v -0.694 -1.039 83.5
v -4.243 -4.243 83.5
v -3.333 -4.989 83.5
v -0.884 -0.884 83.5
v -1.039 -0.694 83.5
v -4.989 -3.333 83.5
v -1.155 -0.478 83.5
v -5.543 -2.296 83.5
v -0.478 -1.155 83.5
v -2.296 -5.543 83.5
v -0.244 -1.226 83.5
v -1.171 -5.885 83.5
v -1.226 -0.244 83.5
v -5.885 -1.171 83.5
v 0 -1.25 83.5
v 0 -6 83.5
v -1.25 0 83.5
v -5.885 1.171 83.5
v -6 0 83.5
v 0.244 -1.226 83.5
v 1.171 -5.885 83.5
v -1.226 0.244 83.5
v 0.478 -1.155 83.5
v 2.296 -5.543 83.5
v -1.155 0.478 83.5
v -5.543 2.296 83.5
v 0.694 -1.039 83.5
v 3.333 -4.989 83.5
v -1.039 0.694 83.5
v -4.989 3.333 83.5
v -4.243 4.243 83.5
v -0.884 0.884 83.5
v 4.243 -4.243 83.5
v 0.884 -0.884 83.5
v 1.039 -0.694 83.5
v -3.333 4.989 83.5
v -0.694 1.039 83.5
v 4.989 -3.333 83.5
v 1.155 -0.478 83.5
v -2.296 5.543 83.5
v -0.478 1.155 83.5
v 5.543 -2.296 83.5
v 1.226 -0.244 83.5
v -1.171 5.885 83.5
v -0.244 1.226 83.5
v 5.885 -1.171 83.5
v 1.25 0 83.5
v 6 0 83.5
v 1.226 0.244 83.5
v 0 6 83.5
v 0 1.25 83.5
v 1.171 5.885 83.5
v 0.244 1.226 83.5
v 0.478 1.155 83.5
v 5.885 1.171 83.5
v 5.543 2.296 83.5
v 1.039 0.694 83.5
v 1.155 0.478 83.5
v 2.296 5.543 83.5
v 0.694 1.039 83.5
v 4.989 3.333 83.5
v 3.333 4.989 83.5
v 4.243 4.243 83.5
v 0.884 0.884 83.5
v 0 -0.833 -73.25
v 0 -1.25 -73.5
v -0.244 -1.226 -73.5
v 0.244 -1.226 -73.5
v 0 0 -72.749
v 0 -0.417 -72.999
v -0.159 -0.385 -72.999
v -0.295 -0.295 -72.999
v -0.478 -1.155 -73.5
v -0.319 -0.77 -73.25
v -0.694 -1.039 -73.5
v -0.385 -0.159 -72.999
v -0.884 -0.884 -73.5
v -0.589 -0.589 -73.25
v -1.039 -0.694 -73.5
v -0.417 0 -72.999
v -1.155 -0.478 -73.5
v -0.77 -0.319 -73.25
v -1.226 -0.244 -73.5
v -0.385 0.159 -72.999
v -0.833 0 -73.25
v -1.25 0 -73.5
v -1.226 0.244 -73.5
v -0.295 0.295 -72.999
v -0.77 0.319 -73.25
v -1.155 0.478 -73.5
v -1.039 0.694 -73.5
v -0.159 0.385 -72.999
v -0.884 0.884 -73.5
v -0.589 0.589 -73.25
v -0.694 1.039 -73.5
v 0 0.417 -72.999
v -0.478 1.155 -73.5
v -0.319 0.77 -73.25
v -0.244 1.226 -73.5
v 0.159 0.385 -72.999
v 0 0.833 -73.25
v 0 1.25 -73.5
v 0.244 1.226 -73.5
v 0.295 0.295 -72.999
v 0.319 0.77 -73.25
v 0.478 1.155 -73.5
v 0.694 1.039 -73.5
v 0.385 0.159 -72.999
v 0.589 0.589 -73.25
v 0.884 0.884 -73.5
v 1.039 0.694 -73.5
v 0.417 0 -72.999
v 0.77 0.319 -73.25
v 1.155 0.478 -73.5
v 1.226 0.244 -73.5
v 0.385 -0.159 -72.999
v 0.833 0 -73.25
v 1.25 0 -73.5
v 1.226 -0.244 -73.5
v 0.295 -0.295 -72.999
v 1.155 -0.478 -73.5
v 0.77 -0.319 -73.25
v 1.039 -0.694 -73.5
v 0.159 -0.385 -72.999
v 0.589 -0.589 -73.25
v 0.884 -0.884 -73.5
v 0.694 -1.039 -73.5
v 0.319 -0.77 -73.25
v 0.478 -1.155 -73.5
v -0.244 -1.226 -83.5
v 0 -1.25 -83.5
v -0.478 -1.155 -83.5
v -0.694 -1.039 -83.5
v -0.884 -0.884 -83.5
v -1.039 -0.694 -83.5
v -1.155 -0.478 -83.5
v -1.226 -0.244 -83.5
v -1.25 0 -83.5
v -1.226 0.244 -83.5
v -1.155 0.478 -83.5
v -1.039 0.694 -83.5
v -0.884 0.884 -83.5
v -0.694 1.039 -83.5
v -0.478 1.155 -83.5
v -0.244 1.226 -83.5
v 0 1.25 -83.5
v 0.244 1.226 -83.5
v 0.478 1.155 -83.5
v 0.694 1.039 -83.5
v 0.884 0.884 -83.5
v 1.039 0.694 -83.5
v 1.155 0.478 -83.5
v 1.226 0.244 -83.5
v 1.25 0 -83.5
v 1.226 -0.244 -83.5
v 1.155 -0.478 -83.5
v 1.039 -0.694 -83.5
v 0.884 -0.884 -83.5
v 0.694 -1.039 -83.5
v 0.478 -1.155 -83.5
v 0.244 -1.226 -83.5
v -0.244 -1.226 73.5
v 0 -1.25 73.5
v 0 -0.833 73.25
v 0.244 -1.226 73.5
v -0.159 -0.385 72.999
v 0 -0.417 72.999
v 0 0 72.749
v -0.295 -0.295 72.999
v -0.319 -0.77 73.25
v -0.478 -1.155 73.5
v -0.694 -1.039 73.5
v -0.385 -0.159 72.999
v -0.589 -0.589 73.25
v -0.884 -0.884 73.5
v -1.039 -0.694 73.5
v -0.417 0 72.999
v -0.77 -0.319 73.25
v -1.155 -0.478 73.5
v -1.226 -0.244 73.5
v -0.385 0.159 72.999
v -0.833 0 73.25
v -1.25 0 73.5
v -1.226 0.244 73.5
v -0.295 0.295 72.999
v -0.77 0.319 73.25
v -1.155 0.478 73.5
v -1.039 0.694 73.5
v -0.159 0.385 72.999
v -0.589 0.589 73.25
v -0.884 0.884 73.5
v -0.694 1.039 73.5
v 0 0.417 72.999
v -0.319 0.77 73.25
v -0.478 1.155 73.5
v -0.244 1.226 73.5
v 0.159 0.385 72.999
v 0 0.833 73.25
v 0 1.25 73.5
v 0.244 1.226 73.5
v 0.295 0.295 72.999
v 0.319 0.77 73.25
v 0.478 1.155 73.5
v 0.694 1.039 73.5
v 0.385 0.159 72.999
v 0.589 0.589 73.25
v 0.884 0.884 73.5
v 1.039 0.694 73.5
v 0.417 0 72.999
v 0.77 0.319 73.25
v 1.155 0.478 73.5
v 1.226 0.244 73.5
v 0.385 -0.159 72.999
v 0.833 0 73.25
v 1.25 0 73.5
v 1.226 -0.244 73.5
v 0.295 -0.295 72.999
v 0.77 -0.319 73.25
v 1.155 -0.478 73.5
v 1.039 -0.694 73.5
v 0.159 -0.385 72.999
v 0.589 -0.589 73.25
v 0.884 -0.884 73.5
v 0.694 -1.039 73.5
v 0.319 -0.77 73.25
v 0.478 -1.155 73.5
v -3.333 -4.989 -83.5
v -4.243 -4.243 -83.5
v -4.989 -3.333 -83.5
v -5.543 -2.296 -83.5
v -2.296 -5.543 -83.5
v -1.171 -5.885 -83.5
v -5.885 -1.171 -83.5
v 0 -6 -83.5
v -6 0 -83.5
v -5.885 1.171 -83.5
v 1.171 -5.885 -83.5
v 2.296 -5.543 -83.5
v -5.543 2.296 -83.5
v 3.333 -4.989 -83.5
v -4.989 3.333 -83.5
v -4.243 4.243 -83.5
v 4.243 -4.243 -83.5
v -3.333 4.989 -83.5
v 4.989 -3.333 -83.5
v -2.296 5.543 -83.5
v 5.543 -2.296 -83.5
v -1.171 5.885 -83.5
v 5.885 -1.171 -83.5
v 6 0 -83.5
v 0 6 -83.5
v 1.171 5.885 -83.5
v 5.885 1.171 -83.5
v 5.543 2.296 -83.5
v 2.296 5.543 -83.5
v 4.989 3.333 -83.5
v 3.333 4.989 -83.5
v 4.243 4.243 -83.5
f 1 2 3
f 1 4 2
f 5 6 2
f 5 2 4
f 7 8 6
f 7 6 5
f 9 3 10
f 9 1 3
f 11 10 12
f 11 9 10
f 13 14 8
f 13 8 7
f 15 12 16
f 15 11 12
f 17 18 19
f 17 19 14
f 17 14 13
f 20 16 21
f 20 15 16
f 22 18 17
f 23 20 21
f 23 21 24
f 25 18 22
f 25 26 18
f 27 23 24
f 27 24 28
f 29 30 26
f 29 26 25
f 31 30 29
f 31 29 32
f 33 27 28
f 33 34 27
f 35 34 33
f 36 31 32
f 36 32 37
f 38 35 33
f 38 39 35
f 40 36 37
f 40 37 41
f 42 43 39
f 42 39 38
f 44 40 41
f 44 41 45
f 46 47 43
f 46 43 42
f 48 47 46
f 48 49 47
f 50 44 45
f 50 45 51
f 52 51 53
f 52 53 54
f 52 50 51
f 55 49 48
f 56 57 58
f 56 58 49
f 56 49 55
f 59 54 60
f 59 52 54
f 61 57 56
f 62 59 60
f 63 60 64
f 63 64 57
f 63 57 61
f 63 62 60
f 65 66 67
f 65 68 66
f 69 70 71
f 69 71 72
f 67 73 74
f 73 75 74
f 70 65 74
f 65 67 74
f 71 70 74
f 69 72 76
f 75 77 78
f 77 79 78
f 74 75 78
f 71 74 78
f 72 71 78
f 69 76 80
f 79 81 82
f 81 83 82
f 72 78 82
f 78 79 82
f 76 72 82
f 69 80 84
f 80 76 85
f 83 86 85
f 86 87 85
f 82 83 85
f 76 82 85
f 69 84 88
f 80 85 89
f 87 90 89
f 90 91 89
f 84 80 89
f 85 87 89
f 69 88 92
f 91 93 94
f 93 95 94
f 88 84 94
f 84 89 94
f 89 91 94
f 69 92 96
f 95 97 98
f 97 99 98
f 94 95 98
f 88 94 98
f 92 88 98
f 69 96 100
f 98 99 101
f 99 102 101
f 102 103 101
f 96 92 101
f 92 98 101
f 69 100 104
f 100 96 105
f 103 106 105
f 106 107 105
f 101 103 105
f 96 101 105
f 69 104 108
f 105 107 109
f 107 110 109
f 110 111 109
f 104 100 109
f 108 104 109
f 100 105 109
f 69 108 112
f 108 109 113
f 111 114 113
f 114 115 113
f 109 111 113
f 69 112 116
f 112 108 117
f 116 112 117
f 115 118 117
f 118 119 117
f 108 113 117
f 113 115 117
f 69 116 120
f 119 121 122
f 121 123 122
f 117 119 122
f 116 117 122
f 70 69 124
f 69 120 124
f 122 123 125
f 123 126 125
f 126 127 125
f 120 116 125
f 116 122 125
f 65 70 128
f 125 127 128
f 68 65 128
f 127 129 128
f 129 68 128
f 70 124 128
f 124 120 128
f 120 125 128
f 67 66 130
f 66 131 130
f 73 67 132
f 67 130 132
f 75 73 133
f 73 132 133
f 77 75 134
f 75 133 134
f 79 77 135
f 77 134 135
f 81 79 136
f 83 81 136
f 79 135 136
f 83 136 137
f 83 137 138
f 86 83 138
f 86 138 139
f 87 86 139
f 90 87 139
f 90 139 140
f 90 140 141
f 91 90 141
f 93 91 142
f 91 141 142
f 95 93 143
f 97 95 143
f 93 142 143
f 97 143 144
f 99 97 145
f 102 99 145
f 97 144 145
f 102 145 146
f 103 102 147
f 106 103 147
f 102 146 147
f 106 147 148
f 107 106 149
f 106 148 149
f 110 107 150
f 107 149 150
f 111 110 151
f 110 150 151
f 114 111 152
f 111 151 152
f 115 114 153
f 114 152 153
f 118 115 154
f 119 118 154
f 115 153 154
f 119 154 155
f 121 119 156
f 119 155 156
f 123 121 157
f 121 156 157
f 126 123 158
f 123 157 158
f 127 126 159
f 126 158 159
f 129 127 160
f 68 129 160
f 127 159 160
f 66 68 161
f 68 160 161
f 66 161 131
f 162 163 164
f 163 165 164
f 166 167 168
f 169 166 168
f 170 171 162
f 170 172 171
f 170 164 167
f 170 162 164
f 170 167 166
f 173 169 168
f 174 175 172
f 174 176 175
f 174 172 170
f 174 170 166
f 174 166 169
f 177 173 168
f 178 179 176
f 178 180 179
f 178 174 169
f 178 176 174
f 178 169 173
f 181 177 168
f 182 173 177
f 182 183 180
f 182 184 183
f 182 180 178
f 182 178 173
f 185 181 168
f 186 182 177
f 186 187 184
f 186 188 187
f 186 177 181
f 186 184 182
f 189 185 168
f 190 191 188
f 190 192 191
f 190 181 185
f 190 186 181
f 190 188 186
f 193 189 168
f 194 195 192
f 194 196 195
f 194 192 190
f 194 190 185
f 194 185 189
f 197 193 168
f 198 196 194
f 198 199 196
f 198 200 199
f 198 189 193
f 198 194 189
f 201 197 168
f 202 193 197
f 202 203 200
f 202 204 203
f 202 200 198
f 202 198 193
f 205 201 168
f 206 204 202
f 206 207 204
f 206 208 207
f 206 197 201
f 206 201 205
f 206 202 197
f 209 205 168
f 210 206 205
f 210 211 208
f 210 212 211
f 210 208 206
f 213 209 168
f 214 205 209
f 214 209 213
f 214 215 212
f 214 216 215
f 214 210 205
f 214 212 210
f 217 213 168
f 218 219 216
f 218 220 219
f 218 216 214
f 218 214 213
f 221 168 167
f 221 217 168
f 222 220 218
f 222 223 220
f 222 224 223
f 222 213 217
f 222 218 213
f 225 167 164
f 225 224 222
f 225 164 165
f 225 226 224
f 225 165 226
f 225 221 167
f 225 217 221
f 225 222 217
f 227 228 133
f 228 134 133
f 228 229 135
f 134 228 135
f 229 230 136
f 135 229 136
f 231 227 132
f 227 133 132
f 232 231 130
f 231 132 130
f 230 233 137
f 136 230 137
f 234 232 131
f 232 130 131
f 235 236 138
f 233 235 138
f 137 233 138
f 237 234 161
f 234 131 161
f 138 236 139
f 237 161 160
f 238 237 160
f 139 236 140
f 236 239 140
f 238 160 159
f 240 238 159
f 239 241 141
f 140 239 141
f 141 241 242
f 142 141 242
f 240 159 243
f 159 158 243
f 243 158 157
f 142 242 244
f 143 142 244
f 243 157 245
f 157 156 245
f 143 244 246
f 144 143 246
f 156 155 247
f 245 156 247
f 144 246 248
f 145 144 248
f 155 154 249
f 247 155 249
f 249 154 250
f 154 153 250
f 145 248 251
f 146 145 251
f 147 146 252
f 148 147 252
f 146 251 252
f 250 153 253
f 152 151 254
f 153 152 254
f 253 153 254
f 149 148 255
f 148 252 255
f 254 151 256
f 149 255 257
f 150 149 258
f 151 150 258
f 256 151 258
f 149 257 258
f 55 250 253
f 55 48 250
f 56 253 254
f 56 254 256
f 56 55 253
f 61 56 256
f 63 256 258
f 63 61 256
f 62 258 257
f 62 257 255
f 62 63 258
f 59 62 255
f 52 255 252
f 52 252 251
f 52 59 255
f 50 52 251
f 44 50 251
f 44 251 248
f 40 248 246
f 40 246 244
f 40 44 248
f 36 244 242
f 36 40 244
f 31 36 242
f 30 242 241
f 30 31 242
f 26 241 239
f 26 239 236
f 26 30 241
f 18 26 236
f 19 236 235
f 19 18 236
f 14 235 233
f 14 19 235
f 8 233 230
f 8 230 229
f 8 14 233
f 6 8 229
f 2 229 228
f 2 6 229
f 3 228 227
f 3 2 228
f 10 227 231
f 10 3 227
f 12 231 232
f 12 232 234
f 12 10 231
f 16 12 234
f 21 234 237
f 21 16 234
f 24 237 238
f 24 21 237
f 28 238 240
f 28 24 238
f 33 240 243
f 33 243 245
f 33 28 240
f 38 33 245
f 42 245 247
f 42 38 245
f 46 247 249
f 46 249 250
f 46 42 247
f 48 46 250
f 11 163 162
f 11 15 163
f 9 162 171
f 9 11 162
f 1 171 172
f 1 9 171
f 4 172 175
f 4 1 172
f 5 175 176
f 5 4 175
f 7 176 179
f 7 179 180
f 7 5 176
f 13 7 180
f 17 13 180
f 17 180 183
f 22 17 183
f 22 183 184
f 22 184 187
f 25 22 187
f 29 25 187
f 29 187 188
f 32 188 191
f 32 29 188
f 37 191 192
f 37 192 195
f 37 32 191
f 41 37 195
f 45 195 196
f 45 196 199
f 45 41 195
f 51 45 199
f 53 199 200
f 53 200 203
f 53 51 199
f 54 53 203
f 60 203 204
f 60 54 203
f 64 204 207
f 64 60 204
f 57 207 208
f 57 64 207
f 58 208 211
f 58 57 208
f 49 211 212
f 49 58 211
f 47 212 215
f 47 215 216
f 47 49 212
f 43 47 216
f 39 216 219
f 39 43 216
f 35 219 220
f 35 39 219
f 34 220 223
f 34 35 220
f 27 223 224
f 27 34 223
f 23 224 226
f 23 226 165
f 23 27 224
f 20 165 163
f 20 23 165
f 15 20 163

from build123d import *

# Parameters (mm, degrees)
SKETCH2_R           = 6
BOSS_EXTRUDE1_DEPTH = 83.5


with BuildPart() as part:
    # Sketch2 → Boss-Extrude1 (new body, symmetric)
    with BuildSketch(Plane.XY):
        Circle(SKETCH2_R)
    extrude(amount=BOSS_EXTRUDE1_DEPTH, both=True)

    # Sketch4 → Tap Drill for M3x0.5 Tap1 (revolve, cut)
    with BuildSketch(Plane(origin=(0, 0, 83.5), x_dir=(0, -1, 0), z_dir=(1, 0, 0))):
        Polygon((0, 0), (0, 10.751075774), (1.25, 10), (1.25, 0), align=None)
    tap_drill_for_m3x0_5_tap1 = revolve(axis=Axis((0, 0, 89.85), (0, 0, -1)), mode=Mode.SUBTRACT)

    # Mirror1: Tap Drill for M3x0.5 Tap1 across plane
    add(tap_drill_for_m3x0_5_tap1.mirror(Plane.XY), mode=Mode.SUBTRACT)


solid = part.part
